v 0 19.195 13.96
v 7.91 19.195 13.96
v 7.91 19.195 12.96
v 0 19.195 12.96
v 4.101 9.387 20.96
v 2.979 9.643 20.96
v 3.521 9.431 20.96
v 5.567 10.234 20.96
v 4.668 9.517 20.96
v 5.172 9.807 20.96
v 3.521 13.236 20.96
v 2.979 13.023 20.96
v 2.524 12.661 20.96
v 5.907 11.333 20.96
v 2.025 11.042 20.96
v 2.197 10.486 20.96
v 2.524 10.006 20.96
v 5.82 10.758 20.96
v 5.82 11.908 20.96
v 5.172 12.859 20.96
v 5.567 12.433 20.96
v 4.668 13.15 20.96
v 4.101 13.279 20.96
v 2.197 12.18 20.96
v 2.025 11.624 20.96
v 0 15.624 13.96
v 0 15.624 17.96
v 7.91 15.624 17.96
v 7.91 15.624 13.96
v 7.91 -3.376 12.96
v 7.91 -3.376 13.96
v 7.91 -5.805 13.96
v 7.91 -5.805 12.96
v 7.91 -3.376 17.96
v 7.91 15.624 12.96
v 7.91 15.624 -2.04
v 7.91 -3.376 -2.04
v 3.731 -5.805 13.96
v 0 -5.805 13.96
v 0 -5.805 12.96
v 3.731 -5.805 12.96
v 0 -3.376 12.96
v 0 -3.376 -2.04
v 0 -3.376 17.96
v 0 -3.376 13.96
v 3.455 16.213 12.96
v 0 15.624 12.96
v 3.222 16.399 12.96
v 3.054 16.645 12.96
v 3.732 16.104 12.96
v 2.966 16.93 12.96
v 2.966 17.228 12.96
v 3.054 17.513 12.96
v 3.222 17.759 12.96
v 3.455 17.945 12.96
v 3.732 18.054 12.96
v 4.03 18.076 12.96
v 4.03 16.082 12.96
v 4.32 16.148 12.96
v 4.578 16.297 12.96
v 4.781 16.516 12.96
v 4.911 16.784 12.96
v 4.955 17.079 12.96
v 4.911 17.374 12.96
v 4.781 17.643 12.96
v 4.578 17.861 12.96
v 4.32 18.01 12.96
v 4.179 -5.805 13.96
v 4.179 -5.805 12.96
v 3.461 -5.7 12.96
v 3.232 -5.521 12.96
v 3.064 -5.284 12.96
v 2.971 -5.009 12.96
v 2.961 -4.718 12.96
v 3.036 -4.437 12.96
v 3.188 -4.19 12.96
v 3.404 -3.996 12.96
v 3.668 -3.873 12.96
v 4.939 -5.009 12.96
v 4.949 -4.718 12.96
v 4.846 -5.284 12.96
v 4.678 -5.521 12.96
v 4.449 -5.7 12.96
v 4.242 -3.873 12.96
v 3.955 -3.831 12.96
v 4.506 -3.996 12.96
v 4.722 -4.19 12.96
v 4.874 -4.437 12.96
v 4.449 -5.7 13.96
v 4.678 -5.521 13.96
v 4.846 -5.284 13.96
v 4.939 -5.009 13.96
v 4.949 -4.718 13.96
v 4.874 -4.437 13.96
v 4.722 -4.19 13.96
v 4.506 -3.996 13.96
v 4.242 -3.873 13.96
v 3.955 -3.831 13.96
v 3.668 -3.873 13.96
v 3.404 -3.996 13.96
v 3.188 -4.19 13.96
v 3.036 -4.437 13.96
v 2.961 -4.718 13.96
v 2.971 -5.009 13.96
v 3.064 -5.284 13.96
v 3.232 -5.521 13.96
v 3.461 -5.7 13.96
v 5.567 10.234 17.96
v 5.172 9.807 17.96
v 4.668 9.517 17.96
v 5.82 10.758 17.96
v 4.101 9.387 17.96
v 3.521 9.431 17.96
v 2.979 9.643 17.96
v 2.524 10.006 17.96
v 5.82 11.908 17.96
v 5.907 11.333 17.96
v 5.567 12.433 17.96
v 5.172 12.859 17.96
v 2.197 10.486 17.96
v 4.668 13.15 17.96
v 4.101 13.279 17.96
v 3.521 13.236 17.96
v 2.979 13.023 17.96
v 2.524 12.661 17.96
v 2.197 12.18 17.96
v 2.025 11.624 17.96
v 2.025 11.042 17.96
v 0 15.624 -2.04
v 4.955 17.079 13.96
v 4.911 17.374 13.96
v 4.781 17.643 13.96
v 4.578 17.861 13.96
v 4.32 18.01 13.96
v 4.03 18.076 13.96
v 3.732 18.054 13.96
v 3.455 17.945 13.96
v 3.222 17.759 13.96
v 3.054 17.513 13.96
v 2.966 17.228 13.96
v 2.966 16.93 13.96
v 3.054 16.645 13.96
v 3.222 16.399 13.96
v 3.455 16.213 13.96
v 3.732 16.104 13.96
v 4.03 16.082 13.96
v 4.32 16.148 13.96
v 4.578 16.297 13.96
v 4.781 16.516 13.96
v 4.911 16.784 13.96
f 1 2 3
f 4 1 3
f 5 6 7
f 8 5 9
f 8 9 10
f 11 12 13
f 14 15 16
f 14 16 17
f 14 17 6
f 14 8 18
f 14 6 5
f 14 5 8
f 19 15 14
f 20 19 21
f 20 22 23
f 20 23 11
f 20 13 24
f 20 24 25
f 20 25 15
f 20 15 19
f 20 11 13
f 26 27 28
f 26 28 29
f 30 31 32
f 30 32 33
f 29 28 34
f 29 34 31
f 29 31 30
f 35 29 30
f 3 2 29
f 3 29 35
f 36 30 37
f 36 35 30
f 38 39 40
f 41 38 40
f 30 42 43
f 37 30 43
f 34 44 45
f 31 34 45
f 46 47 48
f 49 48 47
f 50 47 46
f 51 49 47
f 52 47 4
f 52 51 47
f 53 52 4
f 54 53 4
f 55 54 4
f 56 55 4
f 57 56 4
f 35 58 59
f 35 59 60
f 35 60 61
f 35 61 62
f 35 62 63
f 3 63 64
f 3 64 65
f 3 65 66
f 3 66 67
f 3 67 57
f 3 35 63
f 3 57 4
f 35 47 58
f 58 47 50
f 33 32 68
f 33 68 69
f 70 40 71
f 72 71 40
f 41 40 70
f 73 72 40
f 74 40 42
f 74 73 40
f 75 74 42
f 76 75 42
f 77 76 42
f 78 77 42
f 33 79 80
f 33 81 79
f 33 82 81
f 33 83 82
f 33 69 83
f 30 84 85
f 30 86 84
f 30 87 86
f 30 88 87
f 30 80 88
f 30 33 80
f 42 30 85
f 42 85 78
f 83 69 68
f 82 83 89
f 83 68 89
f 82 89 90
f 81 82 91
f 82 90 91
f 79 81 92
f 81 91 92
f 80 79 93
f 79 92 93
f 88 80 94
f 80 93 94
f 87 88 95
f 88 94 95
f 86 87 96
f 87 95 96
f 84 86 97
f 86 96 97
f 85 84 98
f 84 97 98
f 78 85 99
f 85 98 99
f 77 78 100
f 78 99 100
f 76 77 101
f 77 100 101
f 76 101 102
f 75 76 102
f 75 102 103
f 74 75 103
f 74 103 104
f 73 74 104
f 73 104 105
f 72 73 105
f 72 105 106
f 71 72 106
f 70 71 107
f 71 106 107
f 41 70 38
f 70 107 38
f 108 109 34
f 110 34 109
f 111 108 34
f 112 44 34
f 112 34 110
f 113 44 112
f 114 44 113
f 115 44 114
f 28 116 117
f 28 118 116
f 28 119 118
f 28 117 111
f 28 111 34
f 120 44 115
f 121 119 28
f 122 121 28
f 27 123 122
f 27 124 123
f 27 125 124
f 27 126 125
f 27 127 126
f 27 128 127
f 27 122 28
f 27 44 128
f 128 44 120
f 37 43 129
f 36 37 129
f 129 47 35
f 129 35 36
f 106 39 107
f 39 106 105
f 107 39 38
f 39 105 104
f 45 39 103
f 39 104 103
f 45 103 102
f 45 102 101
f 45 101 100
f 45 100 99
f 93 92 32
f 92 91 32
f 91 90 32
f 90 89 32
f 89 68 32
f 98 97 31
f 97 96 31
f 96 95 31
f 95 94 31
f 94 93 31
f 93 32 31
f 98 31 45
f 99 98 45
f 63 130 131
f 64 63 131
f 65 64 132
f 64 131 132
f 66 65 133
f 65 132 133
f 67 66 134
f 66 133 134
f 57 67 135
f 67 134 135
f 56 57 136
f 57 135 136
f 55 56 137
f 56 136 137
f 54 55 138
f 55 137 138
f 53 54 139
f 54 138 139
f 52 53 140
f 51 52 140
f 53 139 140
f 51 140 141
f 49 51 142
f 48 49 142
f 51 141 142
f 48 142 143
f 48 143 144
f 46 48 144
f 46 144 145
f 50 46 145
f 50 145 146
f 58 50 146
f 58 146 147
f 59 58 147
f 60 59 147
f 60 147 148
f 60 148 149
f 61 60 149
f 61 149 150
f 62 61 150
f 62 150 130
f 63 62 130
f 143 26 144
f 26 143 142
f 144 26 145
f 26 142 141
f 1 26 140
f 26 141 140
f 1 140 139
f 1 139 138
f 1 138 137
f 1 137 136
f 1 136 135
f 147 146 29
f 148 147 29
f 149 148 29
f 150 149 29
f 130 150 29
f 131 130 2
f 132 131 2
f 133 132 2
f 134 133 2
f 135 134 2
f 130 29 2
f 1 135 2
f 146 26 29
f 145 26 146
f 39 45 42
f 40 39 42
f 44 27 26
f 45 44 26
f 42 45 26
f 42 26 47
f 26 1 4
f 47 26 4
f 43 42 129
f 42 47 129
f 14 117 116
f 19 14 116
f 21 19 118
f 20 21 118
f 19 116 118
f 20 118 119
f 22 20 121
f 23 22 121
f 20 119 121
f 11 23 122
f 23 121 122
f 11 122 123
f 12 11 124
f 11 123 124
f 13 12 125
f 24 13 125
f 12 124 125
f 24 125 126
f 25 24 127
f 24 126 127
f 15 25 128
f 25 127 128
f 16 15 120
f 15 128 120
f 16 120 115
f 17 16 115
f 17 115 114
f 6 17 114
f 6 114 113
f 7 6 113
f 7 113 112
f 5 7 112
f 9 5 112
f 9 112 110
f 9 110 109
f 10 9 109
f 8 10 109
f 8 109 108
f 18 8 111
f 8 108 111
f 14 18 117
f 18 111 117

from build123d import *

# Parameters (mm, degrees)
SKETCH1_W           = 20
SKETCH1_H           = 19
BOSS_EXTRUDE1_DEPTH = 7.91
SKETCH2_W           = 1
SKETCH2_H           = 25
BOSS_EXTRUDE2_DEPTH = 7.91
SKETCH3_R           = 1
CUT_EXTRUDE1_DEPTH  = 21.9
SKETCH4_R           = 1.951580775
BOSS_EXTRUDE3_DEPTH = 3


with BuildPart() as part:
    # Sketch1 → Boss-Extrude1 (new body)
    with BuildSketch(Plane(origin=(0, 0, 0), x_dir=(0, 0, -1), z_dir=(1, 0, 0))):
        with Locations((-7.960008023, 6.124197801)):
            Rectangle(SKETCH1_W, SKETCH1_H)
    extrude(amount=BOSS_EXTRUDE1_DEPTH)

    # Sketch2 → Boss-Extrude2 (add)
    with BuildSketch(Plane(origin=(7.91, 0, 0), x_dir=(0, 0, -1), z_dir=(1, 0, 0))):
        with Locations((-13.460008023, 6.694520813)):
            Rectangle(SKETCH2_W, SKETCH2_H)
    extrude(amount=-BOSS_EXTRUDE2_DEPTH)

    # Sketch3 → Cut-Extrude1 (cut)
    with BuildSketch(Plane.XY.offset(13.960008023)):
        with Locations((3.955, 17.079197801)):
            Circle(SKETCH3_R)
        with Locations((3.955, -4.830802199)):
            Circle(SKETCH3_R)
    extrude(amount=-CUT_EXTRUDE1_DEPTH, mode=Mode.SUBTRACT)

    # Sketch4 → Boss-Extrude3 (add)
    with BuildSketch(Plane.XY.offset(17.960008023)):
        with Locations((3.955, 11.333194866)):
            Circle(SKETCH4_R)
    extrude(amount=BOSS_EXTRUDE3_DEPTH)


solid = part.part
